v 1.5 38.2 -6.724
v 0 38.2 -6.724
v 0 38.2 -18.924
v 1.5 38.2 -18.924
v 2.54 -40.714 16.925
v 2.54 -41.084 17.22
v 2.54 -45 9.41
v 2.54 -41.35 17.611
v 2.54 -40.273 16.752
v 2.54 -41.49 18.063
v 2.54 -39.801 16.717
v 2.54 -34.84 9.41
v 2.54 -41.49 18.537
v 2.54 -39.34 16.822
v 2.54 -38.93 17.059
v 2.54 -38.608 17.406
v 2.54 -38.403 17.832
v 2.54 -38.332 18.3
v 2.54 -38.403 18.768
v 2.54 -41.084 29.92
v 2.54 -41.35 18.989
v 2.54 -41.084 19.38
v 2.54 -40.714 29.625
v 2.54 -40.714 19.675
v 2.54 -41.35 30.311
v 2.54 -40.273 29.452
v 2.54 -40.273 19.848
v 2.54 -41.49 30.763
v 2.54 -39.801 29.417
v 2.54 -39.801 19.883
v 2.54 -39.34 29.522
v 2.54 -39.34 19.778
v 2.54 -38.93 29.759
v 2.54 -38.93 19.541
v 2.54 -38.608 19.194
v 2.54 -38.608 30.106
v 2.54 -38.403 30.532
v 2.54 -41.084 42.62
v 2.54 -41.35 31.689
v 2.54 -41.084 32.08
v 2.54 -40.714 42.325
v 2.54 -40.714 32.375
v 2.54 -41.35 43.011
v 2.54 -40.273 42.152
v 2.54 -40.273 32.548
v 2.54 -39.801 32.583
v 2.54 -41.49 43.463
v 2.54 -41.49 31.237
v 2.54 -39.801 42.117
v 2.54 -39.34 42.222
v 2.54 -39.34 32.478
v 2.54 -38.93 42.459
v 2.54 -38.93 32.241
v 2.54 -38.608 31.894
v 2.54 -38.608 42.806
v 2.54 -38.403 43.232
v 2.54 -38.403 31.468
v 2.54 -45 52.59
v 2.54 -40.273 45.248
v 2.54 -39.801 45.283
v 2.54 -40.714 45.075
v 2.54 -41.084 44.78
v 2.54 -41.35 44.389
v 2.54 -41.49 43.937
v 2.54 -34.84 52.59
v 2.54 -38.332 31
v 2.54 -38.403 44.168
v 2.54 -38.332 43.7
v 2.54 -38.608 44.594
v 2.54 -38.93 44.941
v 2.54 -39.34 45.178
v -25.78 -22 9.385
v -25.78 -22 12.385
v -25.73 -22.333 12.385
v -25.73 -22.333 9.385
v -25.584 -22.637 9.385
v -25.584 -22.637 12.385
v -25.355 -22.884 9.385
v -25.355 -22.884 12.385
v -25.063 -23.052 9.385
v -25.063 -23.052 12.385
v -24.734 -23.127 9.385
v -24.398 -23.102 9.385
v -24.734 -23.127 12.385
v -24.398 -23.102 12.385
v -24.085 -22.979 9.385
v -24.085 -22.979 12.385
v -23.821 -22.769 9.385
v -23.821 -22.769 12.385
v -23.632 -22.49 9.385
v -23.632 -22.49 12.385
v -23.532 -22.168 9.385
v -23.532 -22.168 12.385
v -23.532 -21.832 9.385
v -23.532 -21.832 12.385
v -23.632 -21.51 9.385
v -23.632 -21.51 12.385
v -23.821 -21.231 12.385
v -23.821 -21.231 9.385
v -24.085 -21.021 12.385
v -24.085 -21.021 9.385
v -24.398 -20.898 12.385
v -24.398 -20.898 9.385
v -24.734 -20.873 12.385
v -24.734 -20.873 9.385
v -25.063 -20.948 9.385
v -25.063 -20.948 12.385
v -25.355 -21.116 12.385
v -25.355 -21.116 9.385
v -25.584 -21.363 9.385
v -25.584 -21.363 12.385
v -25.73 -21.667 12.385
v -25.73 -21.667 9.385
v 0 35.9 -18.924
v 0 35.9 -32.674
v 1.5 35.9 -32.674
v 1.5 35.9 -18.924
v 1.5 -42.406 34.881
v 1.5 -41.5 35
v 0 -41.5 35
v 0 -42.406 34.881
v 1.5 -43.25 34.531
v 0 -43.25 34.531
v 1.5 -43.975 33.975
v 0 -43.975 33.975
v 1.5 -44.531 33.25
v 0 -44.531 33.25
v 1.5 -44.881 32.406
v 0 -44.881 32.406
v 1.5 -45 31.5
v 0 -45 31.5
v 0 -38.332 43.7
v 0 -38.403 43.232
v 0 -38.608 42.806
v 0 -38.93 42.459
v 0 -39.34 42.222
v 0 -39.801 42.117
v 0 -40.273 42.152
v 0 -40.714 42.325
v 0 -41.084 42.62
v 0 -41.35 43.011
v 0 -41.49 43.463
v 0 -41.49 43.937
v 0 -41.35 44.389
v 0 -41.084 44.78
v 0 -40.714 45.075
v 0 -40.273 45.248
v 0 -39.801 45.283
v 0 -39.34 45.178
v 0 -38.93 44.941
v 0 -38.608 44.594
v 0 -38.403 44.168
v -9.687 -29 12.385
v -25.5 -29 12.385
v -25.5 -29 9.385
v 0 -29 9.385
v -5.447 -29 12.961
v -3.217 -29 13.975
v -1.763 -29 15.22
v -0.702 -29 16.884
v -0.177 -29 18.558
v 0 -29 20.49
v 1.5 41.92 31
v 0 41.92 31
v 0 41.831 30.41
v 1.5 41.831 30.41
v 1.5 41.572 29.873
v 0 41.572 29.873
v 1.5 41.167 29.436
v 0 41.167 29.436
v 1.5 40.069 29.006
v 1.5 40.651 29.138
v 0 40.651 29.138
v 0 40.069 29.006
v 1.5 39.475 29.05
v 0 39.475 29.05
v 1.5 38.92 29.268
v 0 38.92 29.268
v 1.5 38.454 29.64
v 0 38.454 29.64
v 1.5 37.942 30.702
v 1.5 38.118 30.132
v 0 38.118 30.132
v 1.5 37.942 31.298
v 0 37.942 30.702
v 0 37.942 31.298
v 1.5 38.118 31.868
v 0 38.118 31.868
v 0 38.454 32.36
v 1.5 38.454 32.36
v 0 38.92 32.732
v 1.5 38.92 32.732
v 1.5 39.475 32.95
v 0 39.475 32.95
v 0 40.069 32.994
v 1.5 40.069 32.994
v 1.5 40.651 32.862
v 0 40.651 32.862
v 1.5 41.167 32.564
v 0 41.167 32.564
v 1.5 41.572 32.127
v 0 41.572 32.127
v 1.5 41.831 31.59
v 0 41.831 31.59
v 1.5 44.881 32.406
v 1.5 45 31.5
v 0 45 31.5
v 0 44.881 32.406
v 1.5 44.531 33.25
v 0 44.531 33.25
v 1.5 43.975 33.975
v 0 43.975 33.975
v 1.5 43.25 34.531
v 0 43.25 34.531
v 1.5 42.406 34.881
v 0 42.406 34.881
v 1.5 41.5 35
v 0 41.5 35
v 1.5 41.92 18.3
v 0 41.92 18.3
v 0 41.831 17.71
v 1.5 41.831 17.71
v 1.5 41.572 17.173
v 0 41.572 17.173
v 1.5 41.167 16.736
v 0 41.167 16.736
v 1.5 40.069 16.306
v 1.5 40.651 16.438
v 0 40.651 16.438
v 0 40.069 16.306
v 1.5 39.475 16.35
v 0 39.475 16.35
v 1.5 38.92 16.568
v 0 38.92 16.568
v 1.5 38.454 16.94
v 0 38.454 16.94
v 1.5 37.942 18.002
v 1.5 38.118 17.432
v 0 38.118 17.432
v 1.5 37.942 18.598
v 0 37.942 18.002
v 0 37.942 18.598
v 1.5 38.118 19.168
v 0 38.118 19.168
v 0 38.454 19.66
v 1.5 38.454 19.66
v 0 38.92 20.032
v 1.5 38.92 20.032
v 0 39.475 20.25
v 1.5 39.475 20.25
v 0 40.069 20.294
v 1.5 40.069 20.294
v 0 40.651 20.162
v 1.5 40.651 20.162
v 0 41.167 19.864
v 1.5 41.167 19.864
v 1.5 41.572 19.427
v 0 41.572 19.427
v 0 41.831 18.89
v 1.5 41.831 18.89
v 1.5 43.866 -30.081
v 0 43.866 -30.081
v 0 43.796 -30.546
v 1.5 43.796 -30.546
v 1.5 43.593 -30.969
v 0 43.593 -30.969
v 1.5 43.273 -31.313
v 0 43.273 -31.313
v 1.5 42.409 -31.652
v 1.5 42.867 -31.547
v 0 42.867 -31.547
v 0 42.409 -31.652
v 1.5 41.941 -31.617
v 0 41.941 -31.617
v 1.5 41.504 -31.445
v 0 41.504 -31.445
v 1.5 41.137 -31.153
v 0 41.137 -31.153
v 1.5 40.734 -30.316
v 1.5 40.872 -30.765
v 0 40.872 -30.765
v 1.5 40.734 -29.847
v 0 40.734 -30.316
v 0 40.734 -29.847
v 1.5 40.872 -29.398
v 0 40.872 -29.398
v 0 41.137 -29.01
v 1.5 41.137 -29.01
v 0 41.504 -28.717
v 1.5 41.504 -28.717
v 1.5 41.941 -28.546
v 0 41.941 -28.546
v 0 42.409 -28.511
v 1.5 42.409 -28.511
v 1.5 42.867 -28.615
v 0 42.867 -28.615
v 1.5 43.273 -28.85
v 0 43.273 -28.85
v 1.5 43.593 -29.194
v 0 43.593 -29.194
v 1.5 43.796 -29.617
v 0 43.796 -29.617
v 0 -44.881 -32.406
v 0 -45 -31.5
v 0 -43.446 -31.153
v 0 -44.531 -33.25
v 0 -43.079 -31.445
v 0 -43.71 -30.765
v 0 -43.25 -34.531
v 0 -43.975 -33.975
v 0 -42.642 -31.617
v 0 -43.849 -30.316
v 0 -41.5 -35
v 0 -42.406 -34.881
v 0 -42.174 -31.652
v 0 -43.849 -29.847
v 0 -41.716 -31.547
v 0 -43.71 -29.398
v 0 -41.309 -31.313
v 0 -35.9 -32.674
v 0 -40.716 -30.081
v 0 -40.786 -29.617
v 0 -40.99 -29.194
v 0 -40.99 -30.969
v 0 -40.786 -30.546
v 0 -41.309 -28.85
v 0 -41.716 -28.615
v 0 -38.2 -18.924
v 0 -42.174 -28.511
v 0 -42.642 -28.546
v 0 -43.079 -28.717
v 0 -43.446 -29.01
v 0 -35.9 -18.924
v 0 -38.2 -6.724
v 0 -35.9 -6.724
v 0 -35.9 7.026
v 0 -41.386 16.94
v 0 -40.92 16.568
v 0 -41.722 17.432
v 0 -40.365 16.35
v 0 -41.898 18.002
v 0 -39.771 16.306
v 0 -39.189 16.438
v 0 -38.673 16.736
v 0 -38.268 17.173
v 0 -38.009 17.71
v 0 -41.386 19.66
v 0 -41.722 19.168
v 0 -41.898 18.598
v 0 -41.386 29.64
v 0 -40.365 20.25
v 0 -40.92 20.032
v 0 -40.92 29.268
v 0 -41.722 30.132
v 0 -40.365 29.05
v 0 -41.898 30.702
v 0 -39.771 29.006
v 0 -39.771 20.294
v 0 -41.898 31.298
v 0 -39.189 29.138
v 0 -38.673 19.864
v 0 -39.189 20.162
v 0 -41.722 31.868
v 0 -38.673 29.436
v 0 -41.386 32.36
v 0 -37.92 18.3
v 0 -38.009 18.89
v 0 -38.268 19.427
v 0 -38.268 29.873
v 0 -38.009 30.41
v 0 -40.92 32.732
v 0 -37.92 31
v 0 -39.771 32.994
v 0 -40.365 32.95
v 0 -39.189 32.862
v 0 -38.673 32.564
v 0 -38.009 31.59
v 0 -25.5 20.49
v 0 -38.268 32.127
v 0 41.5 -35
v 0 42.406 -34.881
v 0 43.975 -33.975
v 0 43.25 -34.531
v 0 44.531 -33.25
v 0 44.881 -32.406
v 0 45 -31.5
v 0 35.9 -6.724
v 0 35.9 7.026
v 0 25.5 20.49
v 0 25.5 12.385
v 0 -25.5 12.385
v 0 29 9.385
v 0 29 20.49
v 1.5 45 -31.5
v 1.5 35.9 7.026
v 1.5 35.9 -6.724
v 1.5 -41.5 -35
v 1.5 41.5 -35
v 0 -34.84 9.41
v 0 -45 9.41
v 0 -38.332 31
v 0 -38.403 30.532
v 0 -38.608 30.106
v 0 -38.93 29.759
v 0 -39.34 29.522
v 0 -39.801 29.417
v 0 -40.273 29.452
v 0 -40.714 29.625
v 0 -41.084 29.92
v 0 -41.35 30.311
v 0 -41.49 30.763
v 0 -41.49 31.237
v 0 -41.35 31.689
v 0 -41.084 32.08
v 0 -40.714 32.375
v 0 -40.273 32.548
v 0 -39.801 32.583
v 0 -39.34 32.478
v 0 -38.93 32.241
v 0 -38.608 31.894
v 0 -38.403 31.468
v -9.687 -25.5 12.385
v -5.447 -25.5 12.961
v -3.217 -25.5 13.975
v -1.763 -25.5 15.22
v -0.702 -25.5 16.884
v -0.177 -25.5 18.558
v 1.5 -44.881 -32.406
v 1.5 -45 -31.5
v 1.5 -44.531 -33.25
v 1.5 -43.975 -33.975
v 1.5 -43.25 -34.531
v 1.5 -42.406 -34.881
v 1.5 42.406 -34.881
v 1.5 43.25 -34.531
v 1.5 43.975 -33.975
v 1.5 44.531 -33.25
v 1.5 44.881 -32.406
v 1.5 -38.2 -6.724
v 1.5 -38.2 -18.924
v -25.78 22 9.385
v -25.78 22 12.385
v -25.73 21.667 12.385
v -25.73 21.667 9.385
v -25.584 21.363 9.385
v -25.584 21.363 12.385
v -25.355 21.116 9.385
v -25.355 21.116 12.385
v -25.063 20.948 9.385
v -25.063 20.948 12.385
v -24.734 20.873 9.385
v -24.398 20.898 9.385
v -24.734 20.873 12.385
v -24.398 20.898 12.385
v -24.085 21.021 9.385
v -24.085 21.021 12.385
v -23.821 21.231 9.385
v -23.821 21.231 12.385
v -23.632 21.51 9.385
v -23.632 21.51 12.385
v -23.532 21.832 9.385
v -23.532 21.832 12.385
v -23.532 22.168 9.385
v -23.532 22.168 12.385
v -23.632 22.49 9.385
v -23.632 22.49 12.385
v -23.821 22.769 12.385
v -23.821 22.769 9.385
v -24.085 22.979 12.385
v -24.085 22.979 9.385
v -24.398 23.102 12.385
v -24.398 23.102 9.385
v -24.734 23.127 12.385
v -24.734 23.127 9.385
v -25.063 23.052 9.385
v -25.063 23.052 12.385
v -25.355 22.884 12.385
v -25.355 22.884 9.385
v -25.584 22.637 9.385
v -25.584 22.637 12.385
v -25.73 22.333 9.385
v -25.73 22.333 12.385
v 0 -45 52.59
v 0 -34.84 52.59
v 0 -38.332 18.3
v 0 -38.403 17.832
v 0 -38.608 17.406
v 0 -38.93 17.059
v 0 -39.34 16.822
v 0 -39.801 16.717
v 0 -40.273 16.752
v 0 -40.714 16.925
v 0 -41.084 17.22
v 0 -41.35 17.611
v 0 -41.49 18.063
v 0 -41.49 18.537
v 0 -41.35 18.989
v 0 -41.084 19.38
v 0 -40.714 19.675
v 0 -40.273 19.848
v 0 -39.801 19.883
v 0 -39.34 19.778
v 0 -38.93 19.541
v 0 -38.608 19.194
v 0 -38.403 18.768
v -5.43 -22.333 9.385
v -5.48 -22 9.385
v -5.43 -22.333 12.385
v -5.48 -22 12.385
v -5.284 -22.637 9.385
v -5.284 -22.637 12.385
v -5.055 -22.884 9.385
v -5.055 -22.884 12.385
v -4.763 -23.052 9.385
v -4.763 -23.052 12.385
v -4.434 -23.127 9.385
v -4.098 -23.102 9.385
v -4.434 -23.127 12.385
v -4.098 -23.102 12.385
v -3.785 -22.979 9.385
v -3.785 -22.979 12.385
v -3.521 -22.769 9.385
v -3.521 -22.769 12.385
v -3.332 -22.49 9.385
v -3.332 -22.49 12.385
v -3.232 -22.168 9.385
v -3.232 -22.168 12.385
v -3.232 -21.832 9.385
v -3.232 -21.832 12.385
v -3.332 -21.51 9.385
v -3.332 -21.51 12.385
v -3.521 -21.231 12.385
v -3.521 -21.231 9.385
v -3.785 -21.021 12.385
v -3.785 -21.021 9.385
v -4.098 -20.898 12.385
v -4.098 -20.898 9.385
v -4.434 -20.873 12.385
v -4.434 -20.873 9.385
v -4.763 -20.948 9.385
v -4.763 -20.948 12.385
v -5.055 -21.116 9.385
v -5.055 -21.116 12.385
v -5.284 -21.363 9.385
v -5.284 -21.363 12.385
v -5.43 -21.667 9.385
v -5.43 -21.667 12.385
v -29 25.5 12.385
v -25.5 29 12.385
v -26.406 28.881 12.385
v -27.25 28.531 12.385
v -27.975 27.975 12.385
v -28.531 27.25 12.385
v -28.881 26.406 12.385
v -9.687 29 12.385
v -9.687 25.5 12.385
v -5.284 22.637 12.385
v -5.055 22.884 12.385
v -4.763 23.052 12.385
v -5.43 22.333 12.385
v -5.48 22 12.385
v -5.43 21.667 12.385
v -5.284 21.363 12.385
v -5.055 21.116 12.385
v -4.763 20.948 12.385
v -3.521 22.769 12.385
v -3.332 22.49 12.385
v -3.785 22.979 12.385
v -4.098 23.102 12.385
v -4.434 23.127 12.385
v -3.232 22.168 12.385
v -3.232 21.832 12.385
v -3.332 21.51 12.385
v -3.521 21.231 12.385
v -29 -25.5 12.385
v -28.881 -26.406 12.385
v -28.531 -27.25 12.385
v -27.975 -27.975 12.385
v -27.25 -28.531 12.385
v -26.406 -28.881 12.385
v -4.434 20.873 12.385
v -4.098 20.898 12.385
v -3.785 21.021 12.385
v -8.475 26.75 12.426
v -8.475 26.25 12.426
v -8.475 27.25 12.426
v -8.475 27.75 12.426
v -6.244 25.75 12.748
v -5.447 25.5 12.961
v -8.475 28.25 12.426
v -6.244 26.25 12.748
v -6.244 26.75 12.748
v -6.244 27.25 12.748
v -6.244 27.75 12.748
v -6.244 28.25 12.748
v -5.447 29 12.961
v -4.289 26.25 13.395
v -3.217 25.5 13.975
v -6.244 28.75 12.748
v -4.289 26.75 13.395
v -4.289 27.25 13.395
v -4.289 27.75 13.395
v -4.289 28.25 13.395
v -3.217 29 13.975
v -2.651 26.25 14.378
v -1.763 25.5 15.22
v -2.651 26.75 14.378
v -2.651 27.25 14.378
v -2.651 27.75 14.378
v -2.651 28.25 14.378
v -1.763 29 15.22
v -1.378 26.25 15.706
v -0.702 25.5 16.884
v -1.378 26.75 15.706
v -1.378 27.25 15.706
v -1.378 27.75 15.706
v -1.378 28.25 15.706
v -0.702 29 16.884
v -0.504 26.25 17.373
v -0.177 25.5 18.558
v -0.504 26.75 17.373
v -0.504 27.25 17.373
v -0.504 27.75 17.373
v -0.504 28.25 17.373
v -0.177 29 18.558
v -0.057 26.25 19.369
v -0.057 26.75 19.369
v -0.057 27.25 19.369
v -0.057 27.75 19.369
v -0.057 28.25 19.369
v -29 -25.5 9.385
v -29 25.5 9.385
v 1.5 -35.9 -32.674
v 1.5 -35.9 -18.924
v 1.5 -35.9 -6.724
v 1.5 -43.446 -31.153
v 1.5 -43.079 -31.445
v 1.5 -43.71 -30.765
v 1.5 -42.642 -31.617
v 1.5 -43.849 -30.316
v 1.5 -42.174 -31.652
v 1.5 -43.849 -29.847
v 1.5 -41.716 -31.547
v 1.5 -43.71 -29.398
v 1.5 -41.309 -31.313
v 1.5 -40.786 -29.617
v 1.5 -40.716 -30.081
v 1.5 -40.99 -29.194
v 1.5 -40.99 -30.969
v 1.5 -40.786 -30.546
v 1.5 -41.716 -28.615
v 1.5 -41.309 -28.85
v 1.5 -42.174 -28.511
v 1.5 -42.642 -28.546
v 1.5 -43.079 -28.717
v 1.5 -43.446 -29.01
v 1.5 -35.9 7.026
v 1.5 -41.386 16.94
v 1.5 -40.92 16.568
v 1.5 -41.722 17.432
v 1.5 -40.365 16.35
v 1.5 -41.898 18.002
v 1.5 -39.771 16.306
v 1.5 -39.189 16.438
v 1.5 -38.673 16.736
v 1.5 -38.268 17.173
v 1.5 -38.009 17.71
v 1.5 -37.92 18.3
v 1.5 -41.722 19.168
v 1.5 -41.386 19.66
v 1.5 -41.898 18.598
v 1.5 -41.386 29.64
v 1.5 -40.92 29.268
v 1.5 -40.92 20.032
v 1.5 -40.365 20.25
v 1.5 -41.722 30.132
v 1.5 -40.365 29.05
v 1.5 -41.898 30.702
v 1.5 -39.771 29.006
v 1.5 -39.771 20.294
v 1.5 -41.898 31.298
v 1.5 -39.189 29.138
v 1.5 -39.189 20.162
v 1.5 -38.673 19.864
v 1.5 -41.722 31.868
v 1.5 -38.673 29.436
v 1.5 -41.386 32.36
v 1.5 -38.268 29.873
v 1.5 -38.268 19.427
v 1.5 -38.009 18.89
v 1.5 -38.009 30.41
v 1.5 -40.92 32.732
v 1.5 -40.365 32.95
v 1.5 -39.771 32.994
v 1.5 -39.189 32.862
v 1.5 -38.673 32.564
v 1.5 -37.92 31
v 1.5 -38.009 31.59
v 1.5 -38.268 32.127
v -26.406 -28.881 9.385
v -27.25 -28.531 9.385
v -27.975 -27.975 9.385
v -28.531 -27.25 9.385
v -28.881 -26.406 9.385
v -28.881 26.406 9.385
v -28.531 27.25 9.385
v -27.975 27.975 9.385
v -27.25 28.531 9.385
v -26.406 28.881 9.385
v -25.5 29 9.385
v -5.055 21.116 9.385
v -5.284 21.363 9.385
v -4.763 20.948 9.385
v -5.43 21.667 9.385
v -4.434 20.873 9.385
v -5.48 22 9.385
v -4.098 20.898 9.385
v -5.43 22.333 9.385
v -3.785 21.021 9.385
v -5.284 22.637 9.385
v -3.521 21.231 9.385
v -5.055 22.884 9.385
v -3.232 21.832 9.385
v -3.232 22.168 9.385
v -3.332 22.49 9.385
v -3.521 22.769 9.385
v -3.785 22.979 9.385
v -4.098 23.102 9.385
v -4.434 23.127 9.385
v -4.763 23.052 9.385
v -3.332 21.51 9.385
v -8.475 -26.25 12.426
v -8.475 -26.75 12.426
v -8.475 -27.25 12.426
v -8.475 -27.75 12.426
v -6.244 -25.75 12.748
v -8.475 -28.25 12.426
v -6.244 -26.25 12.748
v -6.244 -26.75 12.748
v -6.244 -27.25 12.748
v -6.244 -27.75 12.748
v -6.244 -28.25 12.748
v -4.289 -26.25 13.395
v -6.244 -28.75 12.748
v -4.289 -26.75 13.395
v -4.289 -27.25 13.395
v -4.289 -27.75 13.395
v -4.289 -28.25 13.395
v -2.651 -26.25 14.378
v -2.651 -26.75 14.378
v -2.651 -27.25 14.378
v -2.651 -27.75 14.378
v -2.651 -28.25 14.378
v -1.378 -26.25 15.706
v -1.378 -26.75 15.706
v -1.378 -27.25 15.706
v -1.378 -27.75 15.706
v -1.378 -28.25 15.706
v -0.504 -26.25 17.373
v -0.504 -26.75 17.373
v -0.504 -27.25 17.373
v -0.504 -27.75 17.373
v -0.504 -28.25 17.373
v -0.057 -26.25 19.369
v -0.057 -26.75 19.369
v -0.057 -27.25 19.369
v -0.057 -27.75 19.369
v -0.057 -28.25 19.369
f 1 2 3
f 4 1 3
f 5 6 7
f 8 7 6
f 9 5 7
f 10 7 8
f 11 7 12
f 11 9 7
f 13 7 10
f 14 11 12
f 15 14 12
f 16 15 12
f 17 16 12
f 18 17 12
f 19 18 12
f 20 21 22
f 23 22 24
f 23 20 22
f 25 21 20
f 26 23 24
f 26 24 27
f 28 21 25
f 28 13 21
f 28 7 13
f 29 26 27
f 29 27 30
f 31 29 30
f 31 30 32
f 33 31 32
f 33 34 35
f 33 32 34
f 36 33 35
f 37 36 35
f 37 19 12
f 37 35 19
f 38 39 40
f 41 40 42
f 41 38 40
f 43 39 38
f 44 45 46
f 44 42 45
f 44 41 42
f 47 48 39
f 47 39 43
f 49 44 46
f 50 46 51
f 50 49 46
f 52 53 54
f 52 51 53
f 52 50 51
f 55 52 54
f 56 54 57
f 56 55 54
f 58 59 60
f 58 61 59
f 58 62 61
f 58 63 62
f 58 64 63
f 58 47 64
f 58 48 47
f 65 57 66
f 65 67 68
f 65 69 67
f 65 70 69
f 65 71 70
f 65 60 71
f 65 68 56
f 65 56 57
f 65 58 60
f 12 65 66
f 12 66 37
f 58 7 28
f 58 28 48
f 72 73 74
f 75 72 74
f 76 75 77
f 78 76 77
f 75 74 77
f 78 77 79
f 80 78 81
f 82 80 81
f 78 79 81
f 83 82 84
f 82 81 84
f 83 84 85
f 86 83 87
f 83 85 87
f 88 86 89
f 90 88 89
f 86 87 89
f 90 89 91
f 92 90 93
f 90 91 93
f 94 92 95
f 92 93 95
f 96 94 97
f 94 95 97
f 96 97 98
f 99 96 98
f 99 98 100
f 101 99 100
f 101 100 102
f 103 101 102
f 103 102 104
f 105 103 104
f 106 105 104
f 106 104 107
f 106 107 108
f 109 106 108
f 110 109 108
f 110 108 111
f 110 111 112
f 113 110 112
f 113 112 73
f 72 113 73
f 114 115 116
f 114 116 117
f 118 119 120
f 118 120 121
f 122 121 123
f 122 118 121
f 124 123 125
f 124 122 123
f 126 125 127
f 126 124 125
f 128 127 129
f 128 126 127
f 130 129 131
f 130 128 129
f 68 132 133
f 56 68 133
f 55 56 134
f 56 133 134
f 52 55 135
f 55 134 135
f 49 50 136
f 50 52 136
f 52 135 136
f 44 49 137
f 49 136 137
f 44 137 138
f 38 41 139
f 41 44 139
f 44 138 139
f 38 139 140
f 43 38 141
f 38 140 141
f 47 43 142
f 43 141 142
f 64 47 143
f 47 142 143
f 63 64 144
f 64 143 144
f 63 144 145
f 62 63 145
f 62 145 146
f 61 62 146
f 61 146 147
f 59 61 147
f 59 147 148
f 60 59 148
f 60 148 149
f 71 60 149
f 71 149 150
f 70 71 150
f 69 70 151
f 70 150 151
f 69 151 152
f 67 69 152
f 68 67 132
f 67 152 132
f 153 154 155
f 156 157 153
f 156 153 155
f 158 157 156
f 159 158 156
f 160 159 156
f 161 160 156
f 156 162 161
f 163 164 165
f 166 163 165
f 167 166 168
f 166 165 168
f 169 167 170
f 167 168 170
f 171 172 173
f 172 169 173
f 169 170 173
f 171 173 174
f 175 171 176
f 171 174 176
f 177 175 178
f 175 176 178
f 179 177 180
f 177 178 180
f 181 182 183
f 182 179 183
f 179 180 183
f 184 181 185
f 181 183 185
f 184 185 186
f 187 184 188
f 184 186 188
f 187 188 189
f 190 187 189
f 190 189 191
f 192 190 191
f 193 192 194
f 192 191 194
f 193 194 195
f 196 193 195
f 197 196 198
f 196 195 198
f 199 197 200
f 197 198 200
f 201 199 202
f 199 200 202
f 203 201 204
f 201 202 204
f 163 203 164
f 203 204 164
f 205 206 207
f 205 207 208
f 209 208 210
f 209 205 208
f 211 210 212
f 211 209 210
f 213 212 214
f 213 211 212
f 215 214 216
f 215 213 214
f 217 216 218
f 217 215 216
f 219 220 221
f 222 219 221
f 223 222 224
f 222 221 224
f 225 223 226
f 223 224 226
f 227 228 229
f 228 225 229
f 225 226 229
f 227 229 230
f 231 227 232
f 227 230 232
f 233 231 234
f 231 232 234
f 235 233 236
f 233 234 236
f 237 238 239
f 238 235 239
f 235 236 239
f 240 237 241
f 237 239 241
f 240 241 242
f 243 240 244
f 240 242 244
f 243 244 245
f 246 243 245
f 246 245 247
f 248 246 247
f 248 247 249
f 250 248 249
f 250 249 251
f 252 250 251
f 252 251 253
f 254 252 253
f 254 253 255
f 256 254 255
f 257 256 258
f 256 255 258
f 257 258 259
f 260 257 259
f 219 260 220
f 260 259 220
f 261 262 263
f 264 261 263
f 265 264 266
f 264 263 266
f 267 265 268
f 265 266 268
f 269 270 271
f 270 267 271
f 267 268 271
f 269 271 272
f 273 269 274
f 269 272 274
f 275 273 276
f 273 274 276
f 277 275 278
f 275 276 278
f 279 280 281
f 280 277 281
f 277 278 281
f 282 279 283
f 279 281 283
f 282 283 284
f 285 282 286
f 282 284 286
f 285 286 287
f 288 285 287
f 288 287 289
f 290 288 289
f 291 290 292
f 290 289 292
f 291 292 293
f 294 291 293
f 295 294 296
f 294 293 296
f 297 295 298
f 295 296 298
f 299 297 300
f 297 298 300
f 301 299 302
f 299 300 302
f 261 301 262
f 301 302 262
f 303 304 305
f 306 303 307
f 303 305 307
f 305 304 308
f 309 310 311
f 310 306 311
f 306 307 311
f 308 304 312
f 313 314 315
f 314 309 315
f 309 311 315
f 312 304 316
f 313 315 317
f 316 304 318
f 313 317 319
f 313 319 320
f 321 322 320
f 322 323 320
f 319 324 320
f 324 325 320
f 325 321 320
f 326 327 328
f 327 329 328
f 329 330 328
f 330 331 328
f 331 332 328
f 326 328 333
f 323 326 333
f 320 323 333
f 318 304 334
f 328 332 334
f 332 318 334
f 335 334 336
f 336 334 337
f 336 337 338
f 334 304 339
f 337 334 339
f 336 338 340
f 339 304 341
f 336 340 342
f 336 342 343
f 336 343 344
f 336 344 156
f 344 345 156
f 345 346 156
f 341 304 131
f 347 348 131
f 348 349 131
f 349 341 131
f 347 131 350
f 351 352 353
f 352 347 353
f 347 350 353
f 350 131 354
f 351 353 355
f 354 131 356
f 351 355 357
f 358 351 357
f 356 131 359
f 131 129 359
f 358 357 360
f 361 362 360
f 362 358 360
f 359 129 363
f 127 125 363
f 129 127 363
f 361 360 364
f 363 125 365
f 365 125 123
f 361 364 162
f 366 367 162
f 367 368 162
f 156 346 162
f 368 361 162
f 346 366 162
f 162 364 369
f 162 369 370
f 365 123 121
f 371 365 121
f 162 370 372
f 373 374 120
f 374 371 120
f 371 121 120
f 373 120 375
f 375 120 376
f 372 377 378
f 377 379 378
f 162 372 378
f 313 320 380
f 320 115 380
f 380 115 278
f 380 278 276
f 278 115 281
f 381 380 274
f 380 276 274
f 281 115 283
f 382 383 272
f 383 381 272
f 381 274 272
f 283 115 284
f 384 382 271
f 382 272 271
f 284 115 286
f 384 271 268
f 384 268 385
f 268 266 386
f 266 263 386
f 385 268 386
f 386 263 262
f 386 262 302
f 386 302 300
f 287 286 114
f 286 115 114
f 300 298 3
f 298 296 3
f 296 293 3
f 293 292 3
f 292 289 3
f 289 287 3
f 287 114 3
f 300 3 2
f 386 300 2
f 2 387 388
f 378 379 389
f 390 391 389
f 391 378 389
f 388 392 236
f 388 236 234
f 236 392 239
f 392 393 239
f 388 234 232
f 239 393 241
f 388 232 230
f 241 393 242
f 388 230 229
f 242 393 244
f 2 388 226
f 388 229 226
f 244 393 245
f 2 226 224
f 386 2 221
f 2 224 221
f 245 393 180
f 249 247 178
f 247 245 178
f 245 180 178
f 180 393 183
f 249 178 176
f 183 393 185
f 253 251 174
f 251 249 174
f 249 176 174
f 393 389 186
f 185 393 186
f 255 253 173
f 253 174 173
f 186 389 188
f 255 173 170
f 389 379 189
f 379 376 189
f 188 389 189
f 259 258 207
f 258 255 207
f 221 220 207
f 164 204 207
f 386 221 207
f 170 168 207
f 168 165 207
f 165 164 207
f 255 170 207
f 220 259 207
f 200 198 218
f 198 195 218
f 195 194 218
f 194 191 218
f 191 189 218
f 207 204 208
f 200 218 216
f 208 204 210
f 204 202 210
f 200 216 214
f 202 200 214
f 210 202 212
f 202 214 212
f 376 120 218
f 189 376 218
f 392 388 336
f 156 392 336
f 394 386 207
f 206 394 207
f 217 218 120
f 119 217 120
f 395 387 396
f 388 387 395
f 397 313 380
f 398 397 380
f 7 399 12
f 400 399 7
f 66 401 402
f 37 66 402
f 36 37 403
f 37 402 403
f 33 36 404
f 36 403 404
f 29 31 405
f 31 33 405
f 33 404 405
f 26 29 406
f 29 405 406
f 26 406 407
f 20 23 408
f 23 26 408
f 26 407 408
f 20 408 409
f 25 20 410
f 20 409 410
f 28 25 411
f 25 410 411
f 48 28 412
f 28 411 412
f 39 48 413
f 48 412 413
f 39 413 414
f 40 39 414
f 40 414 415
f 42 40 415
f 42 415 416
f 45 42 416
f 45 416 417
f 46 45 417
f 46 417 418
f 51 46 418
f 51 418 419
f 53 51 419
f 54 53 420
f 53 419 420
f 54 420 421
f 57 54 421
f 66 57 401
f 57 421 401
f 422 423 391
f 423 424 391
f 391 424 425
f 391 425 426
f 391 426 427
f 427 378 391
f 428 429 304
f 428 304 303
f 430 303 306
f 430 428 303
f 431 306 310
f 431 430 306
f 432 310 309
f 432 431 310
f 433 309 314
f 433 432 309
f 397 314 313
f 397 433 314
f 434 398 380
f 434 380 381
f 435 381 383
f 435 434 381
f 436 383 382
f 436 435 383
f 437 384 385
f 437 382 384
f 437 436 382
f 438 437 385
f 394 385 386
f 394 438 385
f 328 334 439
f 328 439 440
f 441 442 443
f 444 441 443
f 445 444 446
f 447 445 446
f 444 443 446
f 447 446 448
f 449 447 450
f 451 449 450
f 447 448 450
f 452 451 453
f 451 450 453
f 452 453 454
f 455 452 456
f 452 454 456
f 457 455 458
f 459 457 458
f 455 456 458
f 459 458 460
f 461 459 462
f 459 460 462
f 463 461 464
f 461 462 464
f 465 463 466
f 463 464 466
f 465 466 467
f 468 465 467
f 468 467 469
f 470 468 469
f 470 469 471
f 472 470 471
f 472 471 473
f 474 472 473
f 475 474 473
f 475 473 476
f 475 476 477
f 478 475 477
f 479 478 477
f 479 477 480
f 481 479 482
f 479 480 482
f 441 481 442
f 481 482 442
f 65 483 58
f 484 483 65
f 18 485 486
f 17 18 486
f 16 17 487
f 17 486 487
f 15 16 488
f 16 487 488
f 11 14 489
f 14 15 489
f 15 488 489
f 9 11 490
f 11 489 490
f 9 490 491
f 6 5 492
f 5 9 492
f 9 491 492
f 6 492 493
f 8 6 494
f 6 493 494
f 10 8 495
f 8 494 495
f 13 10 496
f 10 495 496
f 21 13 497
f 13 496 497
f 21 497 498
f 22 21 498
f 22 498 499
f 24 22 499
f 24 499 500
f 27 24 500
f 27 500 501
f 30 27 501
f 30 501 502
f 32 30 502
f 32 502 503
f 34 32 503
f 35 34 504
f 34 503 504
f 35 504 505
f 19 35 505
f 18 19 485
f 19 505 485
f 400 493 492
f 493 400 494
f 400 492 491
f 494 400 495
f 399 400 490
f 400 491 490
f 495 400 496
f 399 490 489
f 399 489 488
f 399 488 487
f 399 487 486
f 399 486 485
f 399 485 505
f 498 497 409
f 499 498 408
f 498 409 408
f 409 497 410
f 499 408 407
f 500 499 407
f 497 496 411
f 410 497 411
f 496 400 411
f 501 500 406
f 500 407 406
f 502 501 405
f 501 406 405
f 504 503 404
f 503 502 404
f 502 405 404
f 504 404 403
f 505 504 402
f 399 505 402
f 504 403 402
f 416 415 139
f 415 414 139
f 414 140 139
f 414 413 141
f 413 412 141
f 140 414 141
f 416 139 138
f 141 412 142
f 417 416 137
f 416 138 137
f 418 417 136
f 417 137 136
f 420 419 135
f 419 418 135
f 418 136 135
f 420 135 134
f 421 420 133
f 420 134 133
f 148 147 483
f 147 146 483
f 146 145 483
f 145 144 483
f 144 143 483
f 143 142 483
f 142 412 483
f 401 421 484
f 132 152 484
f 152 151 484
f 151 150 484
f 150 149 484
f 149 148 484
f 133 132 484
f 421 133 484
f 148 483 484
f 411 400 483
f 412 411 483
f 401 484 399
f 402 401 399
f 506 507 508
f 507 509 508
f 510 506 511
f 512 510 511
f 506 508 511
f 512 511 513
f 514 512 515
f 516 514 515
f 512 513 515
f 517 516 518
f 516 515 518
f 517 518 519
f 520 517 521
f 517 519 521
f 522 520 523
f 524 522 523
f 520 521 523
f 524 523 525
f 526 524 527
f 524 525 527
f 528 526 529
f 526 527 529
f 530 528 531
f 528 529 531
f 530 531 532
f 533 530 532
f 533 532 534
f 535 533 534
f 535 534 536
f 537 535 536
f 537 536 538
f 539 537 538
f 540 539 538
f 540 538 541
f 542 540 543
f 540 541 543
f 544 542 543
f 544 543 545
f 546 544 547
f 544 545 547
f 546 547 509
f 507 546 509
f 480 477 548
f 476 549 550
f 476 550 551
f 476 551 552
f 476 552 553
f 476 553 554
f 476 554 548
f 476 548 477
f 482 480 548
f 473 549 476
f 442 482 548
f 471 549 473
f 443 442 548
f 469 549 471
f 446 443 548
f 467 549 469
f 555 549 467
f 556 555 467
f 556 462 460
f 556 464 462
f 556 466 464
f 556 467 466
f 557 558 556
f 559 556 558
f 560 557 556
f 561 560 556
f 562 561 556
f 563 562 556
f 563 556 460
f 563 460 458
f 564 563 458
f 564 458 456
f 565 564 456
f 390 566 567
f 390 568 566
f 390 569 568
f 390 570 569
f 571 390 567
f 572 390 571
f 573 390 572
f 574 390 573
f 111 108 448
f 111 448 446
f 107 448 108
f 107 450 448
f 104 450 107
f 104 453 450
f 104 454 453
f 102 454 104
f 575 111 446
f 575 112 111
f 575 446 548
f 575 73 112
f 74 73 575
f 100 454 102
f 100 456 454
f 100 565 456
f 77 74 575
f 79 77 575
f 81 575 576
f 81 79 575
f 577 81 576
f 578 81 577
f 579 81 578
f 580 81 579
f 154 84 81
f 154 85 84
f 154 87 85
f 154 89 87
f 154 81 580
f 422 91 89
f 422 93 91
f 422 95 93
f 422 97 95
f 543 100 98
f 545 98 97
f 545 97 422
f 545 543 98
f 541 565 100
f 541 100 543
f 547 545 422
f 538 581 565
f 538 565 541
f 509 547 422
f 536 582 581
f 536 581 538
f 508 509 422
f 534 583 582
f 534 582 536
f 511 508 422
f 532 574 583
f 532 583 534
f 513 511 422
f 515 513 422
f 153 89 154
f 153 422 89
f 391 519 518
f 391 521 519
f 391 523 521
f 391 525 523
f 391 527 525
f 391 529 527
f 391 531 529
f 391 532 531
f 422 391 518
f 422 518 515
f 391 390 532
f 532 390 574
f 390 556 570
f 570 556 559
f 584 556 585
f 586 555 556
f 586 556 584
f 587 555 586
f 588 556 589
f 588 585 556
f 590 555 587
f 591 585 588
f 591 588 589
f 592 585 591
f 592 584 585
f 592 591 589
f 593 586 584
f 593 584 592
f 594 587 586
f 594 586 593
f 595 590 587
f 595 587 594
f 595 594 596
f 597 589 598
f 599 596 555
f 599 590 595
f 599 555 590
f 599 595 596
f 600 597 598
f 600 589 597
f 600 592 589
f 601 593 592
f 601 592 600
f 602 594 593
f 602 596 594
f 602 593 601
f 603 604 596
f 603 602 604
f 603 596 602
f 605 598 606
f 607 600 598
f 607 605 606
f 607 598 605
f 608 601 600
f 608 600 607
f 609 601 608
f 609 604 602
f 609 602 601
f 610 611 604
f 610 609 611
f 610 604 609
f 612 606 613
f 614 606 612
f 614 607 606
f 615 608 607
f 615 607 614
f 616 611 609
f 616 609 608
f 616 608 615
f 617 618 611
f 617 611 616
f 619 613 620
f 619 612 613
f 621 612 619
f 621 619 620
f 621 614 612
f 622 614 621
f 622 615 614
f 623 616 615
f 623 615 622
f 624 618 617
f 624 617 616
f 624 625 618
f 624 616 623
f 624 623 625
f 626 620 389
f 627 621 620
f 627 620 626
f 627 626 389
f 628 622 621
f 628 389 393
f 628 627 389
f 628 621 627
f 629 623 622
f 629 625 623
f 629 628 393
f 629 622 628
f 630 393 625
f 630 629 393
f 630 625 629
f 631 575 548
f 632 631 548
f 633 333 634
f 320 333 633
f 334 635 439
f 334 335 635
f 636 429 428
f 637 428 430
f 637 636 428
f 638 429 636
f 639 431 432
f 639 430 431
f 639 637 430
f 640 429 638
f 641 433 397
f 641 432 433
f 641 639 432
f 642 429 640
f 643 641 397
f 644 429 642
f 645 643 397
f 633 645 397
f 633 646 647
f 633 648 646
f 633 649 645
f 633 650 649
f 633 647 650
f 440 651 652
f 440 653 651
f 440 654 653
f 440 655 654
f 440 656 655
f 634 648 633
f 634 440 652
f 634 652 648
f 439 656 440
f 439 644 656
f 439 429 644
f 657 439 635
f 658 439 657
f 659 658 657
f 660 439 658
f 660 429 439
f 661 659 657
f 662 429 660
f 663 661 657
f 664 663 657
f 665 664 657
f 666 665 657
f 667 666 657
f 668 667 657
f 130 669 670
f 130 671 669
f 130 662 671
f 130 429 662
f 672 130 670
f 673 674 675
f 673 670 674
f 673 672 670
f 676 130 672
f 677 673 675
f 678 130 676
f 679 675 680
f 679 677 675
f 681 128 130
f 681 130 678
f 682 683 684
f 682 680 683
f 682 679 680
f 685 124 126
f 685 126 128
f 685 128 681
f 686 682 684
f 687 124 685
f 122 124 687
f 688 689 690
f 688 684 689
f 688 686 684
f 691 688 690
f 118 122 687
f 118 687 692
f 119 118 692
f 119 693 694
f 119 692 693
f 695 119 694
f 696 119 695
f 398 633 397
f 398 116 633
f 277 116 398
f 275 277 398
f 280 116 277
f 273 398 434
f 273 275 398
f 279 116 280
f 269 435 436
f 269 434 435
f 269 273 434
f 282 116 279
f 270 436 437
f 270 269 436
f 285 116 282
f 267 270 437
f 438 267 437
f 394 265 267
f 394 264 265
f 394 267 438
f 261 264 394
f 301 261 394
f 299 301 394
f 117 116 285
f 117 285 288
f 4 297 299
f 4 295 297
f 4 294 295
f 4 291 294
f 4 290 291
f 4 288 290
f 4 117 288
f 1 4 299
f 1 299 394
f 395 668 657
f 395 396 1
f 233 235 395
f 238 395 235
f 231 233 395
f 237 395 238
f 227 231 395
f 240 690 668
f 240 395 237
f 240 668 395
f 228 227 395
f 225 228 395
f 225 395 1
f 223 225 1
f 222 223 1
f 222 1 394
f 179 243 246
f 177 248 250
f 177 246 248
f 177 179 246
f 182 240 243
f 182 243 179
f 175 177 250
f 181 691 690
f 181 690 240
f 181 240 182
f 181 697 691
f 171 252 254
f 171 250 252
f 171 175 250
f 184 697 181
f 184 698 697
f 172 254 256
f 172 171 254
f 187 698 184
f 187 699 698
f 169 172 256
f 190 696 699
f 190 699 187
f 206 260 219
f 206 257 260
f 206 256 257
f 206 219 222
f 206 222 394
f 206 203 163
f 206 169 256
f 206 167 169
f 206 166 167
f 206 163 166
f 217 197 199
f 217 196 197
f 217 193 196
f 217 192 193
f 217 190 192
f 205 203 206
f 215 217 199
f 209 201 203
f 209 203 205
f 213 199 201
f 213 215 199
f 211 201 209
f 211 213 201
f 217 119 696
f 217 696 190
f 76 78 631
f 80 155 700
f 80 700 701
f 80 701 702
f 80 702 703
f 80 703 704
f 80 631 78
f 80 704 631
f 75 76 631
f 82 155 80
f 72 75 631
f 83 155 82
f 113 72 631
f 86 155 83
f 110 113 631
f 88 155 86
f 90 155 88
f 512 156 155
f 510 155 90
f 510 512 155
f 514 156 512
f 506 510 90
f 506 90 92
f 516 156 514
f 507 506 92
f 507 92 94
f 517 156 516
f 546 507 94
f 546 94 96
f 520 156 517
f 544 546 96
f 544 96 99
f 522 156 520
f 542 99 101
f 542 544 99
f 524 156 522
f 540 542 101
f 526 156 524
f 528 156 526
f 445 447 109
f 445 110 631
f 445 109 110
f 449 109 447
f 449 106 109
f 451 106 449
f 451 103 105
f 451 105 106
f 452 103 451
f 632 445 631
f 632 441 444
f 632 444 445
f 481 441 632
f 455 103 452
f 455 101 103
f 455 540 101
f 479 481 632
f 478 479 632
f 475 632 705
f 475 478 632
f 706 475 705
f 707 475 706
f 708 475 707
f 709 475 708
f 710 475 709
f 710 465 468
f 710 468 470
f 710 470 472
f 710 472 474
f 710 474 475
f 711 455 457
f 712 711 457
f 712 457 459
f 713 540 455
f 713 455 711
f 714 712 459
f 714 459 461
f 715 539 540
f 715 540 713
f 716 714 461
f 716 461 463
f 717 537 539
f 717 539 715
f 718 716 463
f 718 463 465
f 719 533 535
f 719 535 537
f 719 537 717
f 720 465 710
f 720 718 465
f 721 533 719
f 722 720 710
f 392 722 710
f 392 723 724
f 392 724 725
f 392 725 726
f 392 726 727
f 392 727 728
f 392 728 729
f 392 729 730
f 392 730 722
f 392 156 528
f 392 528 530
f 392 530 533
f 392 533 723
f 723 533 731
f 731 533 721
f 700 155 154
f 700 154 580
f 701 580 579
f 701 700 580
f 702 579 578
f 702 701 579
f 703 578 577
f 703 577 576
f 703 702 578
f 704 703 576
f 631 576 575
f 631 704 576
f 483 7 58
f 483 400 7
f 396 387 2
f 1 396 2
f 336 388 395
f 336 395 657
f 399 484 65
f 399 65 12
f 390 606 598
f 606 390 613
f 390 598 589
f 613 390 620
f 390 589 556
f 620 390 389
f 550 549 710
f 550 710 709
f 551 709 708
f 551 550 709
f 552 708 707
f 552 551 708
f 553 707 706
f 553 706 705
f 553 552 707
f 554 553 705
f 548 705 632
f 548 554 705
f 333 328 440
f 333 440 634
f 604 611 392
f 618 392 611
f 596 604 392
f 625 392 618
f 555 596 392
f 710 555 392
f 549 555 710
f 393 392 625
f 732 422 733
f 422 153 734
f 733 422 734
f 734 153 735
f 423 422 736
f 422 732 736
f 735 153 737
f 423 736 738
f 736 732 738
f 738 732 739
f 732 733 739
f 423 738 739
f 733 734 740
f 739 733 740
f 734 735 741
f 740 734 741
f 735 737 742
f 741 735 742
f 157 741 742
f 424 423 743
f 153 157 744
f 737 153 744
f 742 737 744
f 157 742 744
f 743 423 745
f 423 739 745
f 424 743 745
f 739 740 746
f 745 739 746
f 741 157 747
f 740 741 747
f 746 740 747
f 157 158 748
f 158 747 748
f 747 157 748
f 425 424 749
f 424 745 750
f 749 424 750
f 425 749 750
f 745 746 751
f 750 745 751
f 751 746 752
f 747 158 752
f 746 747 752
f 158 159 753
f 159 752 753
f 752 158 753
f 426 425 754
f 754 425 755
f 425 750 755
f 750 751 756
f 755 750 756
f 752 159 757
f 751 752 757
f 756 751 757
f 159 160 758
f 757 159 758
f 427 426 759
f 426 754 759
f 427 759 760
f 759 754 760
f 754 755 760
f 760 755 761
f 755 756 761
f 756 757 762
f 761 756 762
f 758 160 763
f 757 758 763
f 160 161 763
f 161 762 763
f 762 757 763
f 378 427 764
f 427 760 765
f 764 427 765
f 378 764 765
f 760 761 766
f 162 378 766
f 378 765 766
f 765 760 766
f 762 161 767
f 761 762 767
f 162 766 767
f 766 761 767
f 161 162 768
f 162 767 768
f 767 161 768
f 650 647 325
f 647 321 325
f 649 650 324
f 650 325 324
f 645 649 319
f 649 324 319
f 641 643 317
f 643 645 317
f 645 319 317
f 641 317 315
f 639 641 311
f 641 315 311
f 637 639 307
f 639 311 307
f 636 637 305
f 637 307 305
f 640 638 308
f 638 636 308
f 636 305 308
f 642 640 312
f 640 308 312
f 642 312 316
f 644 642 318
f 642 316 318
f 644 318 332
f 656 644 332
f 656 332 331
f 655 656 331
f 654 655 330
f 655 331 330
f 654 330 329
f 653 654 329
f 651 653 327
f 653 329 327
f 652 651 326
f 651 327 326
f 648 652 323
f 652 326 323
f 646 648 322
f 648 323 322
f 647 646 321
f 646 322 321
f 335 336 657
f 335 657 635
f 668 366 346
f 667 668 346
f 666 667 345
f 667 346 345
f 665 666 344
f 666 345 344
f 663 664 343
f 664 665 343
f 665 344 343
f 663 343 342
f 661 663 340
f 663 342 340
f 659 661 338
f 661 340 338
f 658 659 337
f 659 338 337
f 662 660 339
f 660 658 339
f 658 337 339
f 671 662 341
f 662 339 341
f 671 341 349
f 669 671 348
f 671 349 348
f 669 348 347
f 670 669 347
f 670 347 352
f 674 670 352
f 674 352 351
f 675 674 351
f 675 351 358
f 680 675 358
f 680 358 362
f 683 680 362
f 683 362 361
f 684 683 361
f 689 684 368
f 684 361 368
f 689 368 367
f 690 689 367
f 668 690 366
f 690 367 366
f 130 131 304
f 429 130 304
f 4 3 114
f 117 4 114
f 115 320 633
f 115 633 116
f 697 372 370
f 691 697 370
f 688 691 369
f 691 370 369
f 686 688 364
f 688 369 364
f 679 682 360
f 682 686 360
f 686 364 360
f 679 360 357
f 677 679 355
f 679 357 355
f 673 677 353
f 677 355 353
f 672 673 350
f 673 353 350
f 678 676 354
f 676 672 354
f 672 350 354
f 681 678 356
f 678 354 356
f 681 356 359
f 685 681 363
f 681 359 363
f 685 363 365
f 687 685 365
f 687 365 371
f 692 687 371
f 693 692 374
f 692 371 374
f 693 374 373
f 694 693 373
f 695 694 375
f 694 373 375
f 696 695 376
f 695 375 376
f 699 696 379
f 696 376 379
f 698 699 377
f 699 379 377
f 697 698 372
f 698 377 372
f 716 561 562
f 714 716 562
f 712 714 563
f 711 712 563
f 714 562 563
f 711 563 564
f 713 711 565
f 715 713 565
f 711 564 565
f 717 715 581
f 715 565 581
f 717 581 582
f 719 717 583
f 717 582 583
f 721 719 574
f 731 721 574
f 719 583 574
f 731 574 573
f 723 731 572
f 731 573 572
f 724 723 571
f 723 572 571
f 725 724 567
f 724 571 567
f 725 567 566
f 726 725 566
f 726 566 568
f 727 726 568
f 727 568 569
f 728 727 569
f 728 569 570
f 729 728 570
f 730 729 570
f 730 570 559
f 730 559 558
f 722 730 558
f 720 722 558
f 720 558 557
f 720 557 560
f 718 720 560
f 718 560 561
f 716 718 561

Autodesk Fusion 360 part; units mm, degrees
sketch "Sketch1" plane through (0, 0, 0) normal (1, 0, 0) x (0, 1, 0) in component "DIN_rain_mount1 v3"
  line L0 (-5.08, 21.59) -> (5.08, 21.59)
  line L1 (5.08, 21.59) -> (5.08, -21.59)
  line L2 (5.08, -21.59) -> (-5.08, -21.59)
  line L3 (-5.08, -21.59) -> (-5.08, 21.59)
  line L4 (-5.08, 21.59) -> (5.08, -21.59) construction
  line L5 (5.08, 21.59) -> (-5.08, -21.59) construction
  circle A0 centre (0, -12.7) radius 1.5875
  circle A1 centre (0, 0) radius 1.5875
  circle A2 centre (0, 12.7) radius 1.5875
  dimension "d5" = 10.16
  dimension "d6" = 43.18
  dimension "d7" = 3.175
  dimension "d10" = 6.35
  dimension "d11" = 12.7
extrude "Extrude1" add sketch "Sketch1" along normal blind 2.54 makes body 1 in component "DIN_rain_mount1 v3"
sketch "Sketch1 (2)" plane through (0, 0, 0) normal (1, 0, 0) x (0, 1, 0)
  line L0 (45, 35) -> (-45, 35)
  line L1 (-45, 35) -> (-45, -35)
  line L2 (-45, -35) -> (45, -35)
  line L3 (45, -35) -> (45, 35)
  line L4 (45, 35) -> (-45, -35) construction
  line L5 (-45, 35) -> (45, -35) construction
  line L6 (0, 0) -> (0, -35) construction
  line L7 (39.5, 8.6762) -> (-39.5, 8.6762) construction
  line L8 (-39.5, 8.6762) -> (-39.5, -34.3238) construction
  line L9 (-39.5, -34.3238) -> (39.5, -34.3238) construction
  line L10 (39.5, -34.3238) -> (39.5, 8.6762) construction
  line L11 (39.5, 8.6762) -> (-39.5, -34.3238) construction
  line L12 (-39.5, 8.6762) -> (39.5, -34.3238) construction
  line L13 (35.9, 7.0262) -> (-35.9, 7.0262)
  line L14 (-35.9, 7.0262) -> (-35.9, -32.6738)
  line L15 (-35.9, -32.6738) -> (35.9, -32.6738)
  line L16 (35.9, -32.6738) -> (35.9, 7.0262)
  line L17 (35.9, 7.0262) -> (-35.9, -32.6738) construction
  line L18 (-35.9, 7.0262) -> (35.9, -32.6738) construction
  circle A0 centre (42.2913, -30.0813) radius 1.575
  line L19 (0, 0) -> (10.5805, 0) construction
  circle A1 centre (-42.2913, -30.0813) radius 1.575
  circle A2 centre (42.2913, 30.0813) radius 1.575 construction
  circle A3 centre (-42.2913, 30.0813) radius 1.575 construction
  line L20 (0, 0) -> (0, 0.8708) construction
  line L21 (0, 0.8708) -> (0, 35) construction
  line L22 (25, 32.3854) -> (-25, 32.3854) construction
  line L23 (-25, 32.3854) -> (-25, 12.3854) construction
  line L24 (-25, 12.3854) -> (25, 12.3854) construction
  line L25 (25, 12.3854) -> (25, 32.3854) construction
  line L26 (25, 32.3854) -> (-25, 12.3854) construction
  line L27 (-25, 32.3854) -> (25, 12.3854) construction
  line L28 (29, 12.3854) -> (-29, 12.3854)
  line L29 (-29, 12.3854) -> (-29, 9.3854)
  line L30 (-29, 9.3854) -> (29, 9.3854)
  line L31 (29, 9.3854) -> (29, 12.3854)
  line L32 (29, 12.3854) -> (-29, 9.3854) construction
  line L33 (-29, 12.3854) -> (29, 9.3854) construction
  line L34 (0, -12.8238) -> (39.5, -12.8238) construction
  line L35 (35.9, -6.7238) -> (38.2, -6.7238)
  line L36 (38.2, -6.7238) -> (38.2, -18.9238)
  line L37 (38.2, -18.9238) -> (35.9, -18.9238)
  line L38 (35.9, -18.9238) -> (35.9, -6.7238)
  line L39 (-38.2, -18.9238) -> (-35.9, -18.9238)
  line L40 (-38.2, -6.7238) -> (-38.2, -18.9238)
  line L41 (-35.9, -6.7238) -> (-38.2, -6.7238)
  circle A4 centre (-39.92, 31) radius 2
  circle A5 centre (-39.92, 18.3) radius 2
  circle A6 centre (39.92, 31) radius 2
  circle A7 centre (39.92, 18.3) radius 2
  circle A8 centre (-39.92, 31) radius 1.5875
  circle A9 centre (-39.92, 18.3) radius 1.5875
  circle A10 centre (-39.92, 43.7) radius 1.5875
  line L42 (-45, 9.41) -> (-34.84, 9.41)
  line L43 (-34.84, 9.41) -> (-34.84, 52.59)
  line L44 (-34.84, 52.59) -> (-45, 52.59)
  line L45 (-45, 52.59) -> (-45, 9.41)
  point P0 (0, -12.8238)
  point P1 (0, -12.8238)
  point P2 (0, 22.3854)
  point P3 (0, 10.8854)
  point P4 (38.2, -12.8238)
  dimension "d8" = 90
  dimension "d9" = 70
  dimension "d12" = 79
  dimension "d13" = 43
  dimension "d14" = 71.8
  dimension "d15" = 39.7
  dimension "d17" = 3.15
  dimension "d21" = 50
  dimension "d22" = 20
  dimension "d25" = 58
  dimension "d26" = 3
  dimension "d58" = 2.3
  dimension "d59" = 12.2
  dimension "d62" = 4
  dimension "d63" = 4
extrude "Extrude1'" add sketch "Sketch1 (2)" along normal blind 1.5 separate body contours L0 L1 L2 L3 L42 L43 | L0 L1 L42 L43 L45 | L28 L29 L30 L31 makes body 2
extrude "Extrude2" add sketch "Sketch1 (2)" against normal blind 29 contours L28 L29 L30 L31 bodies 2
sketch "Sketch2" plane through (0, 0, 12.3854) normal (0, 0, 1) x (-1, 0, 0)
  line L0 (0, 29) -> (0, -29)
  line L1 (0, -29) -> (29, -29)
  line L2 (29, -29) -> (29, 29)
  line L3 (29, 29) -> (0, 29)
  line L4 (0, 29) -> (29, -29) construction
  line L5 (27.5, 25) -> (1.5, 25) construction
  line L6 (1.5, 25) -> (1.5, -25) construction
  line L7 (1.5, -25) -> (27.5, -25) construction
  line L8 (27.5, -25) -> (27.5, 25) construction
  line L9 (27.5, 25) -> (1.5, -25) construction
  line L10 (1.5, 25) -> (27.5, -25) construction
  circle A0 centre (4.35, -22) radius 1.575 construction
  circle A1 centre (24.65, -22) radius 1.575 construction
  circle A2 centre (4.35, 22) radius 1.575 construction
  circle A3 centre (24.65, 22) radius 1.575 construction
  line L11 (4.35, -22) -> (24.65, 22) construction
  circle A4 centre (4.35, -22) radius 1.1303
  circle A5 centre (24.65, -22) radius 1.1303
  circle A6 centre (4.35, 22) radius 1.1303
  circle A7 centre (24.65, 22) radius 1.1303
  point P0 (14.5, 0)
  point P1 (14.5, 0)
  point P2 (14.5, 0)
  dimension "d32" = 26
  dimension "d33" = 50
  dimension "d37" = 3.15
  dimension "d40" = 20.3
  dimension "d41" = 44
  dimension "d51" = 2.2606
  dimension "d54" = 20.3
  dimension "d55" = 44
fillet "Fillet1" radius 3.5 2 edges at (-29, 29, 10.8854) (-29, -29, 10.8854) on bodies 2
fillet "Fillet2" radius 3.5 4 edges at (0.75, 45, 35) (0.75, 45, -35) (0.75, -45, 35) (0.75, -45, -35) on bodies 2
sketch "Sketch3" plane through (0, -29, 0) normal (0, -1, 0) x (1, 0, 0)
  line L0 (-25.5, 12.3854) -> (-25.5, 9.3854)
  line L1 (-25.5, 9.3854) -> (0, 9.3854)
  line L2 (0, 9.3854) -> (0, 12.3854)
  line L3 (0, 12.3854) -> (-25.5, 12.3854)
  line L4 (0, 35) -> (0, -35) construction
  line L5 (-27.5, 12.3854) -> (-1.5, 12.3854) construction
  spline S0 degree 5 poles (-9.6866, 12.3854) (-9.3387, 12.3854) (-8.655, 12.4012) (-7.6662, 12.4723) (-6.4221, 12.6617) (-4.9991, 13.0566) (-3.7214, 13.6129) (-2.6063, 14.3356) (-1.6713, 15.2291) (-0.9285, 16.2912) (-0.387, 17.5173) (-0.1222, 18.6267) (-0.0222, 19.5305) (0, 20.1649) (0, 20.4901) knots 0 0 0 0 0 0 0.1 0.2 0.3 0.4 0.5 0.6 0.7 0.8 0.9 1 1 1 1 1 1
  line L6 (0, 18.6225) -> (0, 22.3578)
  line L7 (-11.558, 12.3854) -> (-7.8153, 12.3854)
  line L8 (-9.6866, 12.3854) -> (0, 12.3854)
  line L9 (0, 20.4901) -> (0, 12.3854)
  point P0 (-2.4919, 14.508)
extrude "Extrude3" add sketch "Sketch3" against normal blind 3.5 contours L3 S0 L6 L7 L8 L9 bodies 2
sketch "Sketch4" plane through (0, 29, 0) normal (0, 1, 0) x (-1, 0, 0)
  line L0 (25.5, 9.3854) -> (25.5, 12.3854)
  line L1 (25.5, 12.3854) -> (0, 12.3854)
  line L2 (0, 12.3854) -> (0, 9.3854)
  line L3 (0, 9.3854) -> (25.5, 9.3854)
  line L4 (0, 12.3854) -> (9.6866, 12.3854)
  spline S0 degree 5 poles (9.6866, 12.3854) (9.3387, 12.3854) (8.655, 12.4012) (7.6662, 12.4723) (6.4221, 12.6617) (4.9991, 13.0566) (3.7214, 13.6129) (2.6063, 14.3356) (1.6713, 15.2291) (0.9285, 16.2912) (0.387, 17.5173) (0.1222, 18.6267) (0.0222, 19.5305) (0, 20.1649) (0, 20.4901) knots 0 0 0 0 0 0 0.1 0.2 0.3 0.4 0.5 0.6 0.7 0.8 0.9 1 1 1 1 1 1
  line L5 (0, 20.4901) -> (0, 12.3854)
extrude "Extrude4" add sketch "Sketch4" against normal blind 3.5 contours L1 L4 S0 L5 bodies 2
extrude "Extrude5" cut sketch "Sketch2" against normal blind 3 contours A4 | A5 | A6 | A7 bodies 2
component "DIN_rain_mount1 v3" placed x (1, 0, 0) y (0, 1, 0) z (0, 0, 1) at (0, -39.92, 31)
equation "cutout_length = 71.4 mm" comment "71 mm from the manual"
equation "cutout_height = 39.3 mm" comment "39mm from the manual"
equation "plastic_thick = 1.5 mm"
equation "tab_width = 12 mm"
equation "tab_thick = 2.3 mm"
equation "panel_width = 90 mm"
equation "panel_height = 70 mm"
equation "d8 = panel_width"
equation "d9 = panel_height"
equation "power_supply_width = 79 mm"
equation "power_supply_height = 43 mm"
equation "d12 = power_supply_width"
equation "d13 = power_supply_height"
equation "d14 = cutout_length + clearance * 2"
equation "d15 = cutout_height + clearance * 2"
equation "mount_through_hole_diam = 3.15 mm"
equation "d17 = mount_through_hole_diam"
equation "relay_height = 20 mm"
equation "relay_length = 50 mm"
equation "relay_width = 26 mm"
equation "d21 = relay_length"
equation "d22 = relay_height"
equation "relay_ledge_thick = 3 mm"
equation "relay_ledge_length = relay_length + 8 mm"
equation "d25 = relay_ledge_length"
equation "d26 = relay_ledge_thick"
equation "relay_ledge_width = relay_width + 3 mm"
equation "d28 = plastic_thick"
equation "d30 = -relay_ledge_width"
equation "d32 = relay_width"
equation "d33 = relay_length"
equation "relay_dist_bw_holes_length = 44 mm"
equation "relay_dist_bw_holes_width = 20.3 mm"
equation "relay_hole_diam = 3.15 mm"
equation "d37 = relay_hole_diam"
equation "d40 = relay_dist_bw_holes_width"
equation "d41 = relay_dist_bw_holes_length"
equation "relay_mount_tap_diam = 0.089 in"
equation "d51 = relay_mount_tap_diam"
equation "d54 = relay_dist_bw_holes_width"
equation "d55 = relay_dist_bw_holes_length"
equation "d58 = tab_thick"
equation "d59 = tab_width + clearance"
equation "clearance = 0.2 mm"
equation "DIN_rail_mount_hole_diam = 4 mm"
equation "d62 = DIN_rail_mount_hole_diam"
equation "d63 = DIN_rail_mount_hole_diam"
equation "dist_bw_holes = 0.5 in"
equation "holes_diam = 0.125 in"
equation "DIN_rail_width = 0.4 in"
equation "DIN_rail_len = 1.7 in"
equation "d5 = DIN_rail_width"
equation "d6 = DIN_rail_len"
equation "d7 = holes_diam"
equation "d11 = dist_bw_holes"
